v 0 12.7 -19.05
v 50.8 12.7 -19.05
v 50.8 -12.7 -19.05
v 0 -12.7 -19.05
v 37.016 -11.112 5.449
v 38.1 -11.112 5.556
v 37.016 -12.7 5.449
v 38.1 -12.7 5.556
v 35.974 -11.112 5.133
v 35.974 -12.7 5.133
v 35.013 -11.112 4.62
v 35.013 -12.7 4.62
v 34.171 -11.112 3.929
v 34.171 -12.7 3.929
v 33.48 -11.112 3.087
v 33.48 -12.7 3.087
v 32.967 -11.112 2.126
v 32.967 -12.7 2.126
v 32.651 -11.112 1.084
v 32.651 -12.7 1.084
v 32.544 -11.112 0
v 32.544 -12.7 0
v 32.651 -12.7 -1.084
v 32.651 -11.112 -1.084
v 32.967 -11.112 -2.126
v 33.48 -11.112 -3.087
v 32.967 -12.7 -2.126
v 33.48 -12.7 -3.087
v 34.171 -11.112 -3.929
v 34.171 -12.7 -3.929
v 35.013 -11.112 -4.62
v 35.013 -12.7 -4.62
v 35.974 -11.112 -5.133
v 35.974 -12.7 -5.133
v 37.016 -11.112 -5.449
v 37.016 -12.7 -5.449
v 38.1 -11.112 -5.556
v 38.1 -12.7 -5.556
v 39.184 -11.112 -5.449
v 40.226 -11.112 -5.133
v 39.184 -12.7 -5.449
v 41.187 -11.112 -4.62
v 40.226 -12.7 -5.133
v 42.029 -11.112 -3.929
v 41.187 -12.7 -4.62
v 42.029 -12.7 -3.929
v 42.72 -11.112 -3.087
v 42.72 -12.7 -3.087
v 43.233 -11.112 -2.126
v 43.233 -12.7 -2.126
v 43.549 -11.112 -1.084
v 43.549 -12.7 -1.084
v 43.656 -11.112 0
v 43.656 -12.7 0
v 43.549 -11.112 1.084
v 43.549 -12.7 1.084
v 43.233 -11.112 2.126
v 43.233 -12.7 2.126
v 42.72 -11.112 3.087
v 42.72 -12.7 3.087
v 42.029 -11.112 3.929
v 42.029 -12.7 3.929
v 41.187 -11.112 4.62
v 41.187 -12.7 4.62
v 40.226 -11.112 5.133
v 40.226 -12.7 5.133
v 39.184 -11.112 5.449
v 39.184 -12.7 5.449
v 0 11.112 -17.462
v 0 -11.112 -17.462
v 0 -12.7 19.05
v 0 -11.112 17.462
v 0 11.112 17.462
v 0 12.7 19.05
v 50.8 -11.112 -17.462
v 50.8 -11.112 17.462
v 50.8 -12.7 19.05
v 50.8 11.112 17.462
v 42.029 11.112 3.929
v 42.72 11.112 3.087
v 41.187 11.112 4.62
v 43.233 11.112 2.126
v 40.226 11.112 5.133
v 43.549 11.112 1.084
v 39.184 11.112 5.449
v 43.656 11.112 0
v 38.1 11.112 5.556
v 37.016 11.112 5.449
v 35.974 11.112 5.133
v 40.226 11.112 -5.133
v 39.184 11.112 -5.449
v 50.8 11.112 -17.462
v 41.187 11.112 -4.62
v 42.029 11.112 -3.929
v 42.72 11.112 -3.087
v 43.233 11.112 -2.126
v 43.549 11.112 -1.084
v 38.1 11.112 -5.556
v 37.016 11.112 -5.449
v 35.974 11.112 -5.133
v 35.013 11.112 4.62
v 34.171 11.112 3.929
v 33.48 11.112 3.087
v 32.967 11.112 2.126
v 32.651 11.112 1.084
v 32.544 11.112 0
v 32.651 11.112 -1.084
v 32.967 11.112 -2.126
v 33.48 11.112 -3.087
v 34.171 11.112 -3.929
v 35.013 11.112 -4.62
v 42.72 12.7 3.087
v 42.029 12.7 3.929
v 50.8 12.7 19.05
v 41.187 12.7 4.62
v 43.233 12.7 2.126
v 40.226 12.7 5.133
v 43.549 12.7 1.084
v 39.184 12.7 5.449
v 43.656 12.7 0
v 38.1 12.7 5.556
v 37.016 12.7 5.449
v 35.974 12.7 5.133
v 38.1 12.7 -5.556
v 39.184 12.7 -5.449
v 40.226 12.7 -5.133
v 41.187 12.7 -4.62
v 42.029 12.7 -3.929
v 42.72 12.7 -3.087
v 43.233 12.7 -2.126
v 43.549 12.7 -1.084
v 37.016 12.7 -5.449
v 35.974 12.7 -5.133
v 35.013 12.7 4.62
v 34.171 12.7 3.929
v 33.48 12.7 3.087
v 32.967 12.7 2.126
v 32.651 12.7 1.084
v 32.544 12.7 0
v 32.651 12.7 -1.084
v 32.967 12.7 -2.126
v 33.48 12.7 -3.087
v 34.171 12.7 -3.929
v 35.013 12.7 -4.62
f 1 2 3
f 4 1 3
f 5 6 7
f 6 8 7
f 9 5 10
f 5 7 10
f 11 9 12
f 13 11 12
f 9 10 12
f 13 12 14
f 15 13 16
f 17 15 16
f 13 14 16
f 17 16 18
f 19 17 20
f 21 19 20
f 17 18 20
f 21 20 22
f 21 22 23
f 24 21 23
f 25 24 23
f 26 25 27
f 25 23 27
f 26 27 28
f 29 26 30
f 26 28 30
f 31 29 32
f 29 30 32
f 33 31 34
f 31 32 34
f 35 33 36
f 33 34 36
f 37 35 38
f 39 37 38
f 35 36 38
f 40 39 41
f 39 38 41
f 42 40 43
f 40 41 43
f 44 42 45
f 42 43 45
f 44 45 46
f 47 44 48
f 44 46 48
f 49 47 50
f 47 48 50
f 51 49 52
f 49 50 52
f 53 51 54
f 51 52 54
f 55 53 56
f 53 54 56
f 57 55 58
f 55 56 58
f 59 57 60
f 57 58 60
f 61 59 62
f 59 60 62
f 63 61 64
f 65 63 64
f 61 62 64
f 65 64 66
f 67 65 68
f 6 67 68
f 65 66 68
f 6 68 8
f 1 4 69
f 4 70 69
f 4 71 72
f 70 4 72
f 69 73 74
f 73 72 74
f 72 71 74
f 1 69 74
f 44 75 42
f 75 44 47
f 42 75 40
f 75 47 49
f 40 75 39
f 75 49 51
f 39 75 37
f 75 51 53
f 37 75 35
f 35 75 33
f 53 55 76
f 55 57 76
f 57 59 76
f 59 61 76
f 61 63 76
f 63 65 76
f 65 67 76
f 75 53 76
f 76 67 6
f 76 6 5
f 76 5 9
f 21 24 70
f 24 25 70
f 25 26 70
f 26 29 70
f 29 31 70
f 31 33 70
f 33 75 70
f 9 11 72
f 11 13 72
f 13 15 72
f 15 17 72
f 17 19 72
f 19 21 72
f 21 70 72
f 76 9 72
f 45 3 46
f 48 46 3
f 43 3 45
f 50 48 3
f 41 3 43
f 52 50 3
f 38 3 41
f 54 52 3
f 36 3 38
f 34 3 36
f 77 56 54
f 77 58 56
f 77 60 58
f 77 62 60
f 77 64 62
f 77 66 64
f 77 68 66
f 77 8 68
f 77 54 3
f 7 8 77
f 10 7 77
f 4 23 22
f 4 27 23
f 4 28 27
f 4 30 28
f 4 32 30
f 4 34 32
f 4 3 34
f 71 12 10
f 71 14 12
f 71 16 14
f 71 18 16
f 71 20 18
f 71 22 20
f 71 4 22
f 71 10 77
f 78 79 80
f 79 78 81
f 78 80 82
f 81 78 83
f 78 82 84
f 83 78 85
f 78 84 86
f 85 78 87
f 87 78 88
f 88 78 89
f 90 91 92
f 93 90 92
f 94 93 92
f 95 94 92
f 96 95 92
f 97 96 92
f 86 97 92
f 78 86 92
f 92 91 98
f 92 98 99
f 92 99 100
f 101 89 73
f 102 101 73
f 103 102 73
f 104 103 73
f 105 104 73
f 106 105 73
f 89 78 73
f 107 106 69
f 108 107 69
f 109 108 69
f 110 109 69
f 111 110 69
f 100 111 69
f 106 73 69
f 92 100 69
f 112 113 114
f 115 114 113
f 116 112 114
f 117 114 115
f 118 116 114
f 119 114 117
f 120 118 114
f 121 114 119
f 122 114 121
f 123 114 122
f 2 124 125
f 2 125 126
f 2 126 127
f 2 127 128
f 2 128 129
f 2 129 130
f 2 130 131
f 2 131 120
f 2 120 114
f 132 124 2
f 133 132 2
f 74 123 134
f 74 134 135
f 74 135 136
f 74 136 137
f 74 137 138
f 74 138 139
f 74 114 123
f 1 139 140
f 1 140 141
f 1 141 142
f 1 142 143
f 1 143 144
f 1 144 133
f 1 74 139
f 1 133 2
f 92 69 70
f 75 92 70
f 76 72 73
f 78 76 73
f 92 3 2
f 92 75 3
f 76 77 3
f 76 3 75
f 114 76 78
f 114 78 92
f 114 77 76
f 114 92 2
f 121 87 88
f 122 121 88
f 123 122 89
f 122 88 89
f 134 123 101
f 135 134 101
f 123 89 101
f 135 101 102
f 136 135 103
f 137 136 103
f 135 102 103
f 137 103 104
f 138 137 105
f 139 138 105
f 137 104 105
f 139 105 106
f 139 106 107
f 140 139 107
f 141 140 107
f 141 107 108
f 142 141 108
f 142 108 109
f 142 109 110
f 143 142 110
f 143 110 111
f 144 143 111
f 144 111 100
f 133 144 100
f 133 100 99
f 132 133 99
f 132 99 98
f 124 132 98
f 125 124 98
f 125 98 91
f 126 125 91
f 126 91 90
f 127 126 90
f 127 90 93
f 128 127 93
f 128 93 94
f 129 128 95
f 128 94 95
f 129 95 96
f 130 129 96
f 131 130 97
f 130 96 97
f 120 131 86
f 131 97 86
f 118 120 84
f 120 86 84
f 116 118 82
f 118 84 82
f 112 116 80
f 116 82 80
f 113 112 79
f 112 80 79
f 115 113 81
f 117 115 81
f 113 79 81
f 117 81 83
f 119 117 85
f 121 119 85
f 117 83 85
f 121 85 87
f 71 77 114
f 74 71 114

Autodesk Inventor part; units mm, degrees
ref_plane "Work Plane3" through (0, 12.7, 0) normal (0, 1, 0) x (-1, 0, 0)
ref_plane "Start Plane" through (0, 0, 0) normal (1, 0, 0) x (0, 1, 0)
ref_plane "End Plane" through (50.8, 0, 0) normal (1, 0, 0) x (0, 1, 0)
sketch "Sketch" plane through (0, 0, 0) normal (1, 0, 0) x (0, 1, 0)
  line L0 (-12.7, 19.05) -> (12.7, 19.05)
  line L1 (12.7, 19.05) -> (12.7, -19.05)
  line L2 (12.7, -19.05) -> (-12.7, -19.05)
  line L3 (-12.7, -19.05) -> (-12.7, 19.05)
  line L4 (-12.7, 19.05) -> (12.7, -19.05) construction
  line L5 (12.7, 19.05) -> (-12.7, -19.05) construction
  line L6 (-11.1125, 17.4625) -> (11.1125, 17.4625)
  line L7 (11.1125, 17.4625) -> (11.1125, -17.4625)
  line L8 (11.1125, -17.4625) -> (-11.1125, -17.4625)
  line L9 (-11.1125, -17.4625) -> (-11.1125, 17.4625)
  line L10 (-11.1125, 17.4625) -> (11.1125, -17.4625) construction
  line L11 (11.1125, 17.4625) -> (-11.1125, -17.4625) construction
  point P0 (0, 0)
  dimension "d0" = 38.1
  dimension "d1" = 25.4
  dimension "d2" = 1.5875
  dimension "d3" = 1.5875
extrude "Body" add sketch "Sketch" along normal up to surface (50.8 mm away) from surface at 0
sketch "Sketch8" plane through (0, 0, 0) normal (1, 0, 0) x (0, 1, 0)
  line L0 (0, 0) -> (10, 0)
ref_plane "Work Plane6" through (0, 0, 0) normal (0, 0, -1) x (0, 1, 0)
sketch "Sketch9" plane through (0, 0, 0) normal (0, 0, -1) x (0, 1, 0)
  line L0 (-17.78, 0) -> (17.78, 0)
  line L1 (-17.78, 50.8) -> (17.78, 50.8)
  dimension "d21" = 50.8
sketch "Sketch5" plane through (0, 12.7, -19.05) normal (0, 1, 0) x (1, 0, 0)
  line L0 (0, -38.1) -> (0, 0) projected
  point P0 (0, -19.05)
  point P1 (38.1, -19.05)
  dimension "d22" = 38.1
hole "Hole2" at (38.1, 12.7, 0) direction (0, -1, 0) diameter 11.1125 end through all
equation "\"d3\" = d2"
equation "\"G_OFFSET_START\" = 0"
equation "\"G_OFFSET_END\" = 0"
equation "\"d17\" = d4 + G_OFFSET_END"
equation "\"G_L\" = d21"
equation "\"d4\" = 50.8"
properties part number "1606067191933"
